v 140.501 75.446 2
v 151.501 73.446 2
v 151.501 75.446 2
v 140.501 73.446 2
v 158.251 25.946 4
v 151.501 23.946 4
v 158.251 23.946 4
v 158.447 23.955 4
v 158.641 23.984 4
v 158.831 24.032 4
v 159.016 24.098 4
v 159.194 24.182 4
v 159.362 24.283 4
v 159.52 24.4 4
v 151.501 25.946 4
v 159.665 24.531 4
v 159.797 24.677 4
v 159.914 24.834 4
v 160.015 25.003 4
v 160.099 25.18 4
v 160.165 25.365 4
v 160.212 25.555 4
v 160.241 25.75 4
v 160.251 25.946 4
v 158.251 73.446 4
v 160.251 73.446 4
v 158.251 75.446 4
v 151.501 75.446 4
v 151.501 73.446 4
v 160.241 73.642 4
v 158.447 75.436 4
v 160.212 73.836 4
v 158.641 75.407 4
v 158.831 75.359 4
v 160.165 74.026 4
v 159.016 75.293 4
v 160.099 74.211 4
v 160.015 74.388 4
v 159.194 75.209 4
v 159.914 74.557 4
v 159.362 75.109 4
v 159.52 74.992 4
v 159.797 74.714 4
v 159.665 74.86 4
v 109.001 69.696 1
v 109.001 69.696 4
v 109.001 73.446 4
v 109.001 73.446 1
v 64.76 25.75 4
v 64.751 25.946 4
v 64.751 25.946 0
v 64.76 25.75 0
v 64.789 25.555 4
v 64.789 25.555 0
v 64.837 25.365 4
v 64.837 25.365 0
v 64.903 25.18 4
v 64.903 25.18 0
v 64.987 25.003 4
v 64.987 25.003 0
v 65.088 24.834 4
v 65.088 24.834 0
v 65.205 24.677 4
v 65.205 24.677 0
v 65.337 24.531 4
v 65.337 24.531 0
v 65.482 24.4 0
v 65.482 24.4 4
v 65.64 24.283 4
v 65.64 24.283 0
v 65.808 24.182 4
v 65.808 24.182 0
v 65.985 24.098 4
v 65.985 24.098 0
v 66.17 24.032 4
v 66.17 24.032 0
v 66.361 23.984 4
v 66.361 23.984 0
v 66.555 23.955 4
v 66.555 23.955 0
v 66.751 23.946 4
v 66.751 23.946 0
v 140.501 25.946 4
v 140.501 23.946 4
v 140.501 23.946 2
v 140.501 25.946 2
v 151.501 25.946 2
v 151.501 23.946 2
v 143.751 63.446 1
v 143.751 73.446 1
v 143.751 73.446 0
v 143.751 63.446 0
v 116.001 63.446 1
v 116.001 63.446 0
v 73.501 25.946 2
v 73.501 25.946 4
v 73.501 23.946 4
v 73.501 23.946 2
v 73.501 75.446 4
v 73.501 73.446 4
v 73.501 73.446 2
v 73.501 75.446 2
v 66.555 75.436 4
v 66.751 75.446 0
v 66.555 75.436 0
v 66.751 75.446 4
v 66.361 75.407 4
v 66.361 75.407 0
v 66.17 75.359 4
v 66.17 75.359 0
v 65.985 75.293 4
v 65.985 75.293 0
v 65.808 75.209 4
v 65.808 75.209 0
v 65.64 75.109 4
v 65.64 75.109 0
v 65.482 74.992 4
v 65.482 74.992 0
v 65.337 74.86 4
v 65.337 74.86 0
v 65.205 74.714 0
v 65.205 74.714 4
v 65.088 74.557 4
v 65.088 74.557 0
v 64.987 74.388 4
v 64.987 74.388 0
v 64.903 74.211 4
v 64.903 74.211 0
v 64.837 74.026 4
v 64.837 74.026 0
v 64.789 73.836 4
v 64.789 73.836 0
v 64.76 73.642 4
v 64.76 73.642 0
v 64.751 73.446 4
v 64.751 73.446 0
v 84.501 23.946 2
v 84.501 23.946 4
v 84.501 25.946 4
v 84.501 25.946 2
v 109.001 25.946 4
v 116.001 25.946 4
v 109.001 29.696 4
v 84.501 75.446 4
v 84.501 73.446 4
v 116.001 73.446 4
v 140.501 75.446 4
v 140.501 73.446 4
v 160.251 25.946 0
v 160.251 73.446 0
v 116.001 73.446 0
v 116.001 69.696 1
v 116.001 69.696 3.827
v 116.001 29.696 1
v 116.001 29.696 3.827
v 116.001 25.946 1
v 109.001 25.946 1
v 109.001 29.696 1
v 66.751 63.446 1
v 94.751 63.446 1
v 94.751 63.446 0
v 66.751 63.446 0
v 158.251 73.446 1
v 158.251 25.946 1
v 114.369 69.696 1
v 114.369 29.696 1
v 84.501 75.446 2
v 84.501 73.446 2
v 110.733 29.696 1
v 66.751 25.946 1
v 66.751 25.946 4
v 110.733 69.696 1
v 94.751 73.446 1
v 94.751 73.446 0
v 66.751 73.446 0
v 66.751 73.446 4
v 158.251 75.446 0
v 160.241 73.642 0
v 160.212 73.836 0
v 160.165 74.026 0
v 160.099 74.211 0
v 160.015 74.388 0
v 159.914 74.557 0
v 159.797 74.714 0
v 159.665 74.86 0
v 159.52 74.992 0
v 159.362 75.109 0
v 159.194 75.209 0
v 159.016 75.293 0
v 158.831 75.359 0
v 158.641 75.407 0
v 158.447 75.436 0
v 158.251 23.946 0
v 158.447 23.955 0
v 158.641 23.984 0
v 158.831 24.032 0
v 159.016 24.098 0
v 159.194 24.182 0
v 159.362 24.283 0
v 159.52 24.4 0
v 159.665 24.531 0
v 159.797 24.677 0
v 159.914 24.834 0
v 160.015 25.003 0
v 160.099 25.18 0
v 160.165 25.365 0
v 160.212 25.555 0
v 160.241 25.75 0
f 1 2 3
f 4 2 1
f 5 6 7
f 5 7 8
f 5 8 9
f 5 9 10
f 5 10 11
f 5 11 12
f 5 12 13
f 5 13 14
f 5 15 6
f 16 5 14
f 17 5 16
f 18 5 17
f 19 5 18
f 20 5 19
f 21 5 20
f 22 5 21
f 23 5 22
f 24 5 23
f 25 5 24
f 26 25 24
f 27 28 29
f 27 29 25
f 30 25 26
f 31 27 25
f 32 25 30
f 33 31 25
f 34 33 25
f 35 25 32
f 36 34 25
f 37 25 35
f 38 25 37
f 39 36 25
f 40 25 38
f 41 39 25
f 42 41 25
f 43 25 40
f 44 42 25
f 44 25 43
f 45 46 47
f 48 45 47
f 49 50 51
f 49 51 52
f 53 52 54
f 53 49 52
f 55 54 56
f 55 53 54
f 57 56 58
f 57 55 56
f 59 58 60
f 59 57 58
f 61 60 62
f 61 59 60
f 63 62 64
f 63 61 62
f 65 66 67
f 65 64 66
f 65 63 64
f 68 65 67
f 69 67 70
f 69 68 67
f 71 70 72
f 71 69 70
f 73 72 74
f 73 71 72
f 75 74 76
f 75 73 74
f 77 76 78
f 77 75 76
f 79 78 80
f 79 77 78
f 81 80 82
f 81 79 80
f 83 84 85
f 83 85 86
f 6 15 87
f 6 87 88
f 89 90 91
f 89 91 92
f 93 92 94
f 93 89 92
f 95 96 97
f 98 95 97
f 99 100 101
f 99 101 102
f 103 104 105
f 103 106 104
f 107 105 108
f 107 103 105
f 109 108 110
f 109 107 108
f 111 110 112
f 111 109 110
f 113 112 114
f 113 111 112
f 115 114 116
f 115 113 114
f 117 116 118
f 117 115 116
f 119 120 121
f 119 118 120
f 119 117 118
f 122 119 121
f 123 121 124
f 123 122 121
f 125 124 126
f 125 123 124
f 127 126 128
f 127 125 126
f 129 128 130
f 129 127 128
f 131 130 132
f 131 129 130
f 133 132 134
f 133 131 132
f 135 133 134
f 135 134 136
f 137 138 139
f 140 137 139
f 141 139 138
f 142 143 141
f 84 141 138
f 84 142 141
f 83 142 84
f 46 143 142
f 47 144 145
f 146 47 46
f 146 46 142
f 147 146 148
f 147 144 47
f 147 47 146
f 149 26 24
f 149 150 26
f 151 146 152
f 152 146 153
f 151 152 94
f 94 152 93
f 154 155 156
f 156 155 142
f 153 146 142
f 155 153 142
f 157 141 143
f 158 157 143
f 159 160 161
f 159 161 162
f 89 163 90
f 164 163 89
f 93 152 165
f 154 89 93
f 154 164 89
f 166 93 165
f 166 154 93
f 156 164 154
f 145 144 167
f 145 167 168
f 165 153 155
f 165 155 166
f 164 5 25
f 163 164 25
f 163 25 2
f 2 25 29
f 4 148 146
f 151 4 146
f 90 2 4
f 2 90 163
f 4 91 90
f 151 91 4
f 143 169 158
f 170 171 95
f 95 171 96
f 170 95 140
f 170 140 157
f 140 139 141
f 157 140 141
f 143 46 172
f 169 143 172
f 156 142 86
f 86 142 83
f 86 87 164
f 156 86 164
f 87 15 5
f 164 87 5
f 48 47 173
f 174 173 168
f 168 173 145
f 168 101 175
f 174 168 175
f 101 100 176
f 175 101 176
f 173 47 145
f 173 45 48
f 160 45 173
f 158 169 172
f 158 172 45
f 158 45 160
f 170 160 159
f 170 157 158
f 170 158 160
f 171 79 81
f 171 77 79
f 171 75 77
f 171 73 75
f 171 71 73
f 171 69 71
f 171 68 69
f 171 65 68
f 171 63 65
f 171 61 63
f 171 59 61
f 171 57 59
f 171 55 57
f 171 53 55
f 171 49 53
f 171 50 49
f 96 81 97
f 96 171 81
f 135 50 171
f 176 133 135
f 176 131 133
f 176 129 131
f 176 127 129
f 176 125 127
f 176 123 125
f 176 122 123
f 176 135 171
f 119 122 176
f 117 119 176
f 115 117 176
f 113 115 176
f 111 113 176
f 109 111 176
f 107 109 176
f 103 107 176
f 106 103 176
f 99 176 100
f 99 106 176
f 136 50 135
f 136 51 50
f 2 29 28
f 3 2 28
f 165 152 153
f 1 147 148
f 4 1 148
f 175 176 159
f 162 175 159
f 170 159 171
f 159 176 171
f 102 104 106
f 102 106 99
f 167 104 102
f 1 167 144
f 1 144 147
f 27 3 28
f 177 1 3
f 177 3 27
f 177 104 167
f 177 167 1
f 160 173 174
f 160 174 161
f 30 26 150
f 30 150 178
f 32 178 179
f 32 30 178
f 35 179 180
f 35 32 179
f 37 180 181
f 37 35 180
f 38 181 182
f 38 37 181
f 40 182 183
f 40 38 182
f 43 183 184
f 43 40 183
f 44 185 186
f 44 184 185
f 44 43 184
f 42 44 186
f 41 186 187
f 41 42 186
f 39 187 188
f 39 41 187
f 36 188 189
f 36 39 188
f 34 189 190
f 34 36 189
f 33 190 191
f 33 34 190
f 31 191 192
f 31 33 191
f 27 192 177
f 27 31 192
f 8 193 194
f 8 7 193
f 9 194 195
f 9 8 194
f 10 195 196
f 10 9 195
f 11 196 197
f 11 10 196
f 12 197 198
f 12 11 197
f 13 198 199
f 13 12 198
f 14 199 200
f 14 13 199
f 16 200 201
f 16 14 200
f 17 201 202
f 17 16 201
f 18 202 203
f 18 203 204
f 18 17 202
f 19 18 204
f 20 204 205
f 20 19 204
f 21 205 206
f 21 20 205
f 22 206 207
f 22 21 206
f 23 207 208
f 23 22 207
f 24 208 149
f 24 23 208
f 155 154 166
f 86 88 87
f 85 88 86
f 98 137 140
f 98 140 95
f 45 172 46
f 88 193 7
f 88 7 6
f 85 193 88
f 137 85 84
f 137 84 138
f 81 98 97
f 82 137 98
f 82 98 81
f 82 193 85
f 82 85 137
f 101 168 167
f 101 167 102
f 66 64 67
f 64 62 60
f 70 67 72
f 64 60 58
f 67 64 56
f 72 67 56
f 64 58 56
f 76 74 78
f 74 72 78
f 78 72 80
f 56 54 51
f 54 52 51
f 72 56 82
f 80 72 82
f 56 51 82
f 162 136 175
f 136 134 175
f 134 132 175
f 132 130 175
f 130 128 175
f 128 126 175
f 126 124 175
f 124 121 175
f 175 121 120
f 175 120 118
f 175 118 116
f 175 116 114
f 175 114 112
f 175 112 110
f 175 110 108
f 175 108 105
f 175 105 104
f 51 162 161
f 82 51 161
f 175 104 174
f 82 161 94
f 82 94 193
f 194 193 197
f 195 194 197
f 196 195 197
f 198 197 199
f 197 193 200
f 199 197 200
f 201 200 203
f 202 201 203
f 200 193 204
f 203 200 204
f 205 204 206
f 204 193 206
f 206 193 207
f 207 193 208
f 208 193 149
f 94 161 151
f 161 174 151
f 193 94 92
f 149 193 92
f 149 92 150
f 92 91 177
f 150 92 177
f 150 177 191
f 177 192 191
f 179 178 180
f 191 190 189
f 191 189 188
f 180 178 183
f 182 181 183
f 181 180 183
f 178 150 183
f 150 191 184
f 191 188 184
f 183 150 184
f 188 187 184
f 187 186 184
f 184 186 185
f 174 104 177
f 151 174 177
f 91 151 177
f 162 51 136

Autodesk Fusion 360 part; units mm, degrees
sketch "Schizzo1" plane through (0, 0, 0) normal (0, 0, 1) x (1, 0, 0)
  line L0 (64.6508, 75.5456) -> (160.3508, 75.5456) construction
  line L1 (160.3508, 75.5456) -> (160.3508, 23.8456) construction
  line L2 (160.3508, 23.8456) -> (64.6508, 23.8456) construction
  line L3 (64.6508, 23.8456) -> (64.6508, 75.5456) construction
  line L4 (64.6508, 49.6956) -> (160.3508, 49.6956) construction
  line L5 (112.5008, 75.5456) -> (112.5008, 23.8456) construction
  line L6 (160.2508, 23.9456) -> (64.7508, 23.9456)
  line L7 (64.7508, 23.9456) -> (64.7508, 75.4456)
  line L8 (64.7508, 75.4456) -> (160.2508, 75.4456)
  line L9 (160.2508, 75.4456) -> (160.2508, 23.9456)
  line L10 (160.2508, 23.9456) -> (64.7508, 75.4456) construction
  line L11 (64.7508, 23.9456) -> (160.2508, 75.4456) construction
  line L12 (146.3653, 67.9576) -> (78.6363, 31.4336) construction
  line L13 (78.6363, 67.9576) -> (146.3653, 31.4336) construction
  point P0 (112.5008, 49.6956)
  point P1 (112.5008, 49.6956)
  dimension "d1" = 95.7
  dimension "d2" = 51.7
  dimension "d3" = 0.1
  dimension "d4" = 0.1
extrude "Estrusione1" add sketch "Schizzo1" along normal blind 4
fillet "Raccordo1" radius 2 4 edges at (64.7508, 23.9456, 2) (64.7508, 75.4456, 2) (160.2508, 23.9456, 2) (160.2508, 75.4456, 2)
sketch "Schizzo2" plane through (0, 0, 4) normal (0, 0, 1) x (-1, 0, 0)
  arc A0 (-160.2508, -73.4456) -> (-158.2508, -75.4456) centre (-158.2508, -73.4456) ccw
  line L0 (-158.2508, -75.4456) -> (-66.7508, -75.4456)
  arc A1 (-66.7508, -75.4456) -> (-64.7508, -73.4456) centre (-66.7508, -73.4456) ccw
  line L1 (-64.7508, -73.4456) -> (-64.7508, -25.9456)
  arc A2 (-64.7508, -25.9456) -> (-66.7508, -23.9456) centre (-66.7508, -25.9456) ccw
  line L2 (-66.7508, -23.9456) -> (-158.2508, -23.9456)
  arc A3 (-158.2508, -23.9456) -> (-160.2508, -25.9456) centre (-158.2508, -25.9456) ccw
  line L3 (-160.2508, -25.9456) -> (-160.2508, -73.4456)
  line L4 (-64.7508, -75.4456) -> (-160.2508, -75.4456) construction
  line L5 (-160.2508, -75.4456) -> (-160.2508, -23.9456) construction
  line L6 (-160.2508, -23.9456) -> (-64.7508, -23.9456) construction
  line L7 (-64.7508, -23.9456) -> (-64.7508, -75.4456) construction
  line L8 (-64.7508, -49.6956) -> (-160.2508, -49.6956) construction
  line L9 (-112.5008, -75.4456) -> (-112.5008, -23.9456) construction
  line L10 (-158.2508, -73.4456) -> (-66.7508, -73.4456)
  line L11 (-66.7508, -73.4456) -> (-66.7508, -25.9456)
  line L12 (-66.7508, -25.9456) -> (-158.2508, -25.9456)
  line L13 (-158.2508, -25.9456) -> (-158.2508, -73.4456)
  line L14 (-158.2508, -73.4456) -> (-66.7508, -25.9456) construction
  line L15 (-66.7508, -73.4456) -> (-158.2508, -25.9456) construction
  line L16 (-116.0008, -25.9456) -> (-109.0008, -25.9456)
  line L17 (-109.0008, -25.9456) -> (-109.0008, -73.4456)
  line L18 (-109.0008, -73.4456) -> (-116.0008, -73.4456)
  line L19 (-116.0008, -73.4456) -> (-116.0008, -25.9456)
  line L20 (-116.0008, -25.9456) -> (-109.0008, -73.4456) construction
  line L21 (-109.0008, -25.9456) -> (-116.0008, -73.4456) construction
  line L22 (-84.5008, -72.4456) -> (-73.5008, -72.4456)
  line L23 (-73.5008, -72.4456) -> (-73.5008, -75.4456)
  line L24 (-73.5008, -75.4456) -> (-84.5008, -75.4456)
  line L25 (-84.5008, -75.4456) -> (-84.5008, -72.4456)
  line L26 (-84.5008, -72.4456) -> (-73.5008, -75.4456) construction
  line L27 (-73.5008, -72.4456) -> (-84.5008, -75.4456) construction
  line L28 (-151.5008, -72.4456) -> (-151.5008, -75.4456)
  line L29 (-151.5008, -75.4456) -> (-140.5008, -75.4456)
  line L30 (-140.5008, -72.4456) -> (-151.5008, -72.4456)
  line L31 (-140.5008, -75.4456) -> (-140.5008, -72.4456)
  line L32 (-151.5008, -72.4456) -> (-140.5008, -75.4456) construction
  line L33 (-140.5008, -72.4456) -> (-151.5008, -75.4456) construction
  line L34 (-66.7508, -73.4456) -> (-94.7508, -73.4456)
  line L35 (-94.7508, -73.4456) -> (-94.7508, -63.4456)
  line L36 (-94.7508, -63.4456) -> (-66.7508, -63.4456)
  line L37 (-66.7508, -63.4456) -> (-66.7508, -73.4456)
  line L38 (-115.7508, -73.4456) -> (-143.7508, -73.4456)
  line L39 (-143.7508, -73.4456) -> (-143.7508, -63.4456)
  line L40 (-143.7508, -63.4456) -> (-115.7508, -63.4456)
  line L41 (-115.7508, -63.4456) -> (-115.7508, -73.4456)
  line L42 (-84.5008, -26.9456) -> (-73.5008, -26.9456)
  line L43 (-73.5008, -26.9456) -> (-73.5008, -23.9456)
  line L44 (-73.5008, -23.9456) -> (-84.5008, -23.9456)
  line L45 (-84.5008, -23.9456) -> (-84.5008, -26.9456)
  line L46 (-140.5008, -26.9456) -> (-151.5008, -26.9456)
  line L47 (-140.5008, -23.9456) -> (-140.5008, -26.9456)
  line L48 (-151.5008, -26.9456) -> (-151.5008, -23.9456)
  line L49 (-151.5008, -23.9456) -> (-140.5008, -23.9456)
  point P0 (-112.5008, -49.6956)
  point P1 (-112.5008, -49.6956)
  point P2 (-79.0008, -73.9456)
  point P3 (-146.0008, -73.9456)
  dimension "d9" = 2
  dimension "d10" = 2
  dimension "d11" = 7
  dimension "d14" = 11
  dimension "d15" = 3
  dimension "d16" = 67
  dimension "d19" = 28
  dimension "d20" = 10
  dimension "d21" = 28
  dimension "d22" = 10
  dimension "d23" = 49
extrude "Estrusione2" cut sketch "Schizzo2" against normal blind 3 contours L10 L28 L30 L39 | L10 L12 L13 L19 L28 L30 L39 L40 L46 L47 L48 | L10 L19 L30 L31 L38 L39 L40 | L10 L30 L31 L38 L39 | L12 L46 L47 L48 | L10 L22 L23 L25 L34 | L10 L11 L22 L23 L25 L34 L35 L36 L37 | L10 L11 L12 L17 L35 L36 L42 L43 L45 | L12 L42 L43 L45
extrude "Estrusione4" cut sketch "Schizzo2" against normal blind 4 contours L10 L19 L30 L31 L38 L39 L40 | L10 L30 L31 L38 L39 | L10 L22 L23 L25 L34 | L10 L11 L22 L23 L25 L34 L35 L36 L37
extrude "Estrusione5" cut sketch "Schizzo2" against normal blind 2 contours L0 L10 L28 L29 L31 L38 | L2 L12 L47 L48 L49 | L0 L10 L23 L24 L25 L34 | L2 L12 L43 L44 L45
ref_plane "Piano di lavoro1" through (112.5008, 49.6956, 4) normal (0, -1, 0) x (1, 0, 0)
sketch "Schizzo3" plane through (0, 49.6956, 0) normal (0, -1, 0) x (-1, 0, 0)
  line L0 (-64.7508, -4) -> (-160.3508, -4) construction
  line L1 (-160.3508, -4) -> (-160.3508, 0) construction
  line L2 (-160.3508, 0) -> (-64.7508, 0) construction
  line L3 (-64.7508, 0) -> (-64.7508, -4) construction
  line L4 (-109.0008, -1) -> (-109.0008, -4) construction
  line L5 (-64.7508, -1) -> (-160.3508, -1) construction
  line L6 (-94.7508, -1) -> (-109.0008, -1) construction
  line L7 (-109.0008, -4) -> (-109.0008, 0) construction
  line L8 (-116, -4) -> (-116, 0) construction
  line L9 (-109.0008, -1) -> (-109.0008, -4)
  line L10 (-109.0008, -4) -> (-110.7329, -1)
  line L11 (-110.7329, -1) -> (-109.0008, -1)
  line L12 (-110.7329, -1) -> (-109.0008, -4)
  line L13 (-109.0008, -4) -> (-109.0008, -1)
  line L14 (-112.5508, -4) -> (-112.5508, 0) construction
  line L15 (-116.1008, -4) -> (-114.3688, -1)
  line L16 (-116.1008, -4) -> (-116.1008, 0) construction
  line L17 (-114.3688, -1) -> (-116.1008, -1)
  line L18 (-116.1008, -4) -> (-116.1008, -1)
  point P0 (-64.7508, -4)
  point P1 (-160.3508, 0)
  point P2 (-109.0008, -4)
  dimension "d29" = 30
extrude "Estrusione6" cut sketch "Schizzo3" along normal mid plane 40
equation "d21 = d19"
equation "d22 = d20"
